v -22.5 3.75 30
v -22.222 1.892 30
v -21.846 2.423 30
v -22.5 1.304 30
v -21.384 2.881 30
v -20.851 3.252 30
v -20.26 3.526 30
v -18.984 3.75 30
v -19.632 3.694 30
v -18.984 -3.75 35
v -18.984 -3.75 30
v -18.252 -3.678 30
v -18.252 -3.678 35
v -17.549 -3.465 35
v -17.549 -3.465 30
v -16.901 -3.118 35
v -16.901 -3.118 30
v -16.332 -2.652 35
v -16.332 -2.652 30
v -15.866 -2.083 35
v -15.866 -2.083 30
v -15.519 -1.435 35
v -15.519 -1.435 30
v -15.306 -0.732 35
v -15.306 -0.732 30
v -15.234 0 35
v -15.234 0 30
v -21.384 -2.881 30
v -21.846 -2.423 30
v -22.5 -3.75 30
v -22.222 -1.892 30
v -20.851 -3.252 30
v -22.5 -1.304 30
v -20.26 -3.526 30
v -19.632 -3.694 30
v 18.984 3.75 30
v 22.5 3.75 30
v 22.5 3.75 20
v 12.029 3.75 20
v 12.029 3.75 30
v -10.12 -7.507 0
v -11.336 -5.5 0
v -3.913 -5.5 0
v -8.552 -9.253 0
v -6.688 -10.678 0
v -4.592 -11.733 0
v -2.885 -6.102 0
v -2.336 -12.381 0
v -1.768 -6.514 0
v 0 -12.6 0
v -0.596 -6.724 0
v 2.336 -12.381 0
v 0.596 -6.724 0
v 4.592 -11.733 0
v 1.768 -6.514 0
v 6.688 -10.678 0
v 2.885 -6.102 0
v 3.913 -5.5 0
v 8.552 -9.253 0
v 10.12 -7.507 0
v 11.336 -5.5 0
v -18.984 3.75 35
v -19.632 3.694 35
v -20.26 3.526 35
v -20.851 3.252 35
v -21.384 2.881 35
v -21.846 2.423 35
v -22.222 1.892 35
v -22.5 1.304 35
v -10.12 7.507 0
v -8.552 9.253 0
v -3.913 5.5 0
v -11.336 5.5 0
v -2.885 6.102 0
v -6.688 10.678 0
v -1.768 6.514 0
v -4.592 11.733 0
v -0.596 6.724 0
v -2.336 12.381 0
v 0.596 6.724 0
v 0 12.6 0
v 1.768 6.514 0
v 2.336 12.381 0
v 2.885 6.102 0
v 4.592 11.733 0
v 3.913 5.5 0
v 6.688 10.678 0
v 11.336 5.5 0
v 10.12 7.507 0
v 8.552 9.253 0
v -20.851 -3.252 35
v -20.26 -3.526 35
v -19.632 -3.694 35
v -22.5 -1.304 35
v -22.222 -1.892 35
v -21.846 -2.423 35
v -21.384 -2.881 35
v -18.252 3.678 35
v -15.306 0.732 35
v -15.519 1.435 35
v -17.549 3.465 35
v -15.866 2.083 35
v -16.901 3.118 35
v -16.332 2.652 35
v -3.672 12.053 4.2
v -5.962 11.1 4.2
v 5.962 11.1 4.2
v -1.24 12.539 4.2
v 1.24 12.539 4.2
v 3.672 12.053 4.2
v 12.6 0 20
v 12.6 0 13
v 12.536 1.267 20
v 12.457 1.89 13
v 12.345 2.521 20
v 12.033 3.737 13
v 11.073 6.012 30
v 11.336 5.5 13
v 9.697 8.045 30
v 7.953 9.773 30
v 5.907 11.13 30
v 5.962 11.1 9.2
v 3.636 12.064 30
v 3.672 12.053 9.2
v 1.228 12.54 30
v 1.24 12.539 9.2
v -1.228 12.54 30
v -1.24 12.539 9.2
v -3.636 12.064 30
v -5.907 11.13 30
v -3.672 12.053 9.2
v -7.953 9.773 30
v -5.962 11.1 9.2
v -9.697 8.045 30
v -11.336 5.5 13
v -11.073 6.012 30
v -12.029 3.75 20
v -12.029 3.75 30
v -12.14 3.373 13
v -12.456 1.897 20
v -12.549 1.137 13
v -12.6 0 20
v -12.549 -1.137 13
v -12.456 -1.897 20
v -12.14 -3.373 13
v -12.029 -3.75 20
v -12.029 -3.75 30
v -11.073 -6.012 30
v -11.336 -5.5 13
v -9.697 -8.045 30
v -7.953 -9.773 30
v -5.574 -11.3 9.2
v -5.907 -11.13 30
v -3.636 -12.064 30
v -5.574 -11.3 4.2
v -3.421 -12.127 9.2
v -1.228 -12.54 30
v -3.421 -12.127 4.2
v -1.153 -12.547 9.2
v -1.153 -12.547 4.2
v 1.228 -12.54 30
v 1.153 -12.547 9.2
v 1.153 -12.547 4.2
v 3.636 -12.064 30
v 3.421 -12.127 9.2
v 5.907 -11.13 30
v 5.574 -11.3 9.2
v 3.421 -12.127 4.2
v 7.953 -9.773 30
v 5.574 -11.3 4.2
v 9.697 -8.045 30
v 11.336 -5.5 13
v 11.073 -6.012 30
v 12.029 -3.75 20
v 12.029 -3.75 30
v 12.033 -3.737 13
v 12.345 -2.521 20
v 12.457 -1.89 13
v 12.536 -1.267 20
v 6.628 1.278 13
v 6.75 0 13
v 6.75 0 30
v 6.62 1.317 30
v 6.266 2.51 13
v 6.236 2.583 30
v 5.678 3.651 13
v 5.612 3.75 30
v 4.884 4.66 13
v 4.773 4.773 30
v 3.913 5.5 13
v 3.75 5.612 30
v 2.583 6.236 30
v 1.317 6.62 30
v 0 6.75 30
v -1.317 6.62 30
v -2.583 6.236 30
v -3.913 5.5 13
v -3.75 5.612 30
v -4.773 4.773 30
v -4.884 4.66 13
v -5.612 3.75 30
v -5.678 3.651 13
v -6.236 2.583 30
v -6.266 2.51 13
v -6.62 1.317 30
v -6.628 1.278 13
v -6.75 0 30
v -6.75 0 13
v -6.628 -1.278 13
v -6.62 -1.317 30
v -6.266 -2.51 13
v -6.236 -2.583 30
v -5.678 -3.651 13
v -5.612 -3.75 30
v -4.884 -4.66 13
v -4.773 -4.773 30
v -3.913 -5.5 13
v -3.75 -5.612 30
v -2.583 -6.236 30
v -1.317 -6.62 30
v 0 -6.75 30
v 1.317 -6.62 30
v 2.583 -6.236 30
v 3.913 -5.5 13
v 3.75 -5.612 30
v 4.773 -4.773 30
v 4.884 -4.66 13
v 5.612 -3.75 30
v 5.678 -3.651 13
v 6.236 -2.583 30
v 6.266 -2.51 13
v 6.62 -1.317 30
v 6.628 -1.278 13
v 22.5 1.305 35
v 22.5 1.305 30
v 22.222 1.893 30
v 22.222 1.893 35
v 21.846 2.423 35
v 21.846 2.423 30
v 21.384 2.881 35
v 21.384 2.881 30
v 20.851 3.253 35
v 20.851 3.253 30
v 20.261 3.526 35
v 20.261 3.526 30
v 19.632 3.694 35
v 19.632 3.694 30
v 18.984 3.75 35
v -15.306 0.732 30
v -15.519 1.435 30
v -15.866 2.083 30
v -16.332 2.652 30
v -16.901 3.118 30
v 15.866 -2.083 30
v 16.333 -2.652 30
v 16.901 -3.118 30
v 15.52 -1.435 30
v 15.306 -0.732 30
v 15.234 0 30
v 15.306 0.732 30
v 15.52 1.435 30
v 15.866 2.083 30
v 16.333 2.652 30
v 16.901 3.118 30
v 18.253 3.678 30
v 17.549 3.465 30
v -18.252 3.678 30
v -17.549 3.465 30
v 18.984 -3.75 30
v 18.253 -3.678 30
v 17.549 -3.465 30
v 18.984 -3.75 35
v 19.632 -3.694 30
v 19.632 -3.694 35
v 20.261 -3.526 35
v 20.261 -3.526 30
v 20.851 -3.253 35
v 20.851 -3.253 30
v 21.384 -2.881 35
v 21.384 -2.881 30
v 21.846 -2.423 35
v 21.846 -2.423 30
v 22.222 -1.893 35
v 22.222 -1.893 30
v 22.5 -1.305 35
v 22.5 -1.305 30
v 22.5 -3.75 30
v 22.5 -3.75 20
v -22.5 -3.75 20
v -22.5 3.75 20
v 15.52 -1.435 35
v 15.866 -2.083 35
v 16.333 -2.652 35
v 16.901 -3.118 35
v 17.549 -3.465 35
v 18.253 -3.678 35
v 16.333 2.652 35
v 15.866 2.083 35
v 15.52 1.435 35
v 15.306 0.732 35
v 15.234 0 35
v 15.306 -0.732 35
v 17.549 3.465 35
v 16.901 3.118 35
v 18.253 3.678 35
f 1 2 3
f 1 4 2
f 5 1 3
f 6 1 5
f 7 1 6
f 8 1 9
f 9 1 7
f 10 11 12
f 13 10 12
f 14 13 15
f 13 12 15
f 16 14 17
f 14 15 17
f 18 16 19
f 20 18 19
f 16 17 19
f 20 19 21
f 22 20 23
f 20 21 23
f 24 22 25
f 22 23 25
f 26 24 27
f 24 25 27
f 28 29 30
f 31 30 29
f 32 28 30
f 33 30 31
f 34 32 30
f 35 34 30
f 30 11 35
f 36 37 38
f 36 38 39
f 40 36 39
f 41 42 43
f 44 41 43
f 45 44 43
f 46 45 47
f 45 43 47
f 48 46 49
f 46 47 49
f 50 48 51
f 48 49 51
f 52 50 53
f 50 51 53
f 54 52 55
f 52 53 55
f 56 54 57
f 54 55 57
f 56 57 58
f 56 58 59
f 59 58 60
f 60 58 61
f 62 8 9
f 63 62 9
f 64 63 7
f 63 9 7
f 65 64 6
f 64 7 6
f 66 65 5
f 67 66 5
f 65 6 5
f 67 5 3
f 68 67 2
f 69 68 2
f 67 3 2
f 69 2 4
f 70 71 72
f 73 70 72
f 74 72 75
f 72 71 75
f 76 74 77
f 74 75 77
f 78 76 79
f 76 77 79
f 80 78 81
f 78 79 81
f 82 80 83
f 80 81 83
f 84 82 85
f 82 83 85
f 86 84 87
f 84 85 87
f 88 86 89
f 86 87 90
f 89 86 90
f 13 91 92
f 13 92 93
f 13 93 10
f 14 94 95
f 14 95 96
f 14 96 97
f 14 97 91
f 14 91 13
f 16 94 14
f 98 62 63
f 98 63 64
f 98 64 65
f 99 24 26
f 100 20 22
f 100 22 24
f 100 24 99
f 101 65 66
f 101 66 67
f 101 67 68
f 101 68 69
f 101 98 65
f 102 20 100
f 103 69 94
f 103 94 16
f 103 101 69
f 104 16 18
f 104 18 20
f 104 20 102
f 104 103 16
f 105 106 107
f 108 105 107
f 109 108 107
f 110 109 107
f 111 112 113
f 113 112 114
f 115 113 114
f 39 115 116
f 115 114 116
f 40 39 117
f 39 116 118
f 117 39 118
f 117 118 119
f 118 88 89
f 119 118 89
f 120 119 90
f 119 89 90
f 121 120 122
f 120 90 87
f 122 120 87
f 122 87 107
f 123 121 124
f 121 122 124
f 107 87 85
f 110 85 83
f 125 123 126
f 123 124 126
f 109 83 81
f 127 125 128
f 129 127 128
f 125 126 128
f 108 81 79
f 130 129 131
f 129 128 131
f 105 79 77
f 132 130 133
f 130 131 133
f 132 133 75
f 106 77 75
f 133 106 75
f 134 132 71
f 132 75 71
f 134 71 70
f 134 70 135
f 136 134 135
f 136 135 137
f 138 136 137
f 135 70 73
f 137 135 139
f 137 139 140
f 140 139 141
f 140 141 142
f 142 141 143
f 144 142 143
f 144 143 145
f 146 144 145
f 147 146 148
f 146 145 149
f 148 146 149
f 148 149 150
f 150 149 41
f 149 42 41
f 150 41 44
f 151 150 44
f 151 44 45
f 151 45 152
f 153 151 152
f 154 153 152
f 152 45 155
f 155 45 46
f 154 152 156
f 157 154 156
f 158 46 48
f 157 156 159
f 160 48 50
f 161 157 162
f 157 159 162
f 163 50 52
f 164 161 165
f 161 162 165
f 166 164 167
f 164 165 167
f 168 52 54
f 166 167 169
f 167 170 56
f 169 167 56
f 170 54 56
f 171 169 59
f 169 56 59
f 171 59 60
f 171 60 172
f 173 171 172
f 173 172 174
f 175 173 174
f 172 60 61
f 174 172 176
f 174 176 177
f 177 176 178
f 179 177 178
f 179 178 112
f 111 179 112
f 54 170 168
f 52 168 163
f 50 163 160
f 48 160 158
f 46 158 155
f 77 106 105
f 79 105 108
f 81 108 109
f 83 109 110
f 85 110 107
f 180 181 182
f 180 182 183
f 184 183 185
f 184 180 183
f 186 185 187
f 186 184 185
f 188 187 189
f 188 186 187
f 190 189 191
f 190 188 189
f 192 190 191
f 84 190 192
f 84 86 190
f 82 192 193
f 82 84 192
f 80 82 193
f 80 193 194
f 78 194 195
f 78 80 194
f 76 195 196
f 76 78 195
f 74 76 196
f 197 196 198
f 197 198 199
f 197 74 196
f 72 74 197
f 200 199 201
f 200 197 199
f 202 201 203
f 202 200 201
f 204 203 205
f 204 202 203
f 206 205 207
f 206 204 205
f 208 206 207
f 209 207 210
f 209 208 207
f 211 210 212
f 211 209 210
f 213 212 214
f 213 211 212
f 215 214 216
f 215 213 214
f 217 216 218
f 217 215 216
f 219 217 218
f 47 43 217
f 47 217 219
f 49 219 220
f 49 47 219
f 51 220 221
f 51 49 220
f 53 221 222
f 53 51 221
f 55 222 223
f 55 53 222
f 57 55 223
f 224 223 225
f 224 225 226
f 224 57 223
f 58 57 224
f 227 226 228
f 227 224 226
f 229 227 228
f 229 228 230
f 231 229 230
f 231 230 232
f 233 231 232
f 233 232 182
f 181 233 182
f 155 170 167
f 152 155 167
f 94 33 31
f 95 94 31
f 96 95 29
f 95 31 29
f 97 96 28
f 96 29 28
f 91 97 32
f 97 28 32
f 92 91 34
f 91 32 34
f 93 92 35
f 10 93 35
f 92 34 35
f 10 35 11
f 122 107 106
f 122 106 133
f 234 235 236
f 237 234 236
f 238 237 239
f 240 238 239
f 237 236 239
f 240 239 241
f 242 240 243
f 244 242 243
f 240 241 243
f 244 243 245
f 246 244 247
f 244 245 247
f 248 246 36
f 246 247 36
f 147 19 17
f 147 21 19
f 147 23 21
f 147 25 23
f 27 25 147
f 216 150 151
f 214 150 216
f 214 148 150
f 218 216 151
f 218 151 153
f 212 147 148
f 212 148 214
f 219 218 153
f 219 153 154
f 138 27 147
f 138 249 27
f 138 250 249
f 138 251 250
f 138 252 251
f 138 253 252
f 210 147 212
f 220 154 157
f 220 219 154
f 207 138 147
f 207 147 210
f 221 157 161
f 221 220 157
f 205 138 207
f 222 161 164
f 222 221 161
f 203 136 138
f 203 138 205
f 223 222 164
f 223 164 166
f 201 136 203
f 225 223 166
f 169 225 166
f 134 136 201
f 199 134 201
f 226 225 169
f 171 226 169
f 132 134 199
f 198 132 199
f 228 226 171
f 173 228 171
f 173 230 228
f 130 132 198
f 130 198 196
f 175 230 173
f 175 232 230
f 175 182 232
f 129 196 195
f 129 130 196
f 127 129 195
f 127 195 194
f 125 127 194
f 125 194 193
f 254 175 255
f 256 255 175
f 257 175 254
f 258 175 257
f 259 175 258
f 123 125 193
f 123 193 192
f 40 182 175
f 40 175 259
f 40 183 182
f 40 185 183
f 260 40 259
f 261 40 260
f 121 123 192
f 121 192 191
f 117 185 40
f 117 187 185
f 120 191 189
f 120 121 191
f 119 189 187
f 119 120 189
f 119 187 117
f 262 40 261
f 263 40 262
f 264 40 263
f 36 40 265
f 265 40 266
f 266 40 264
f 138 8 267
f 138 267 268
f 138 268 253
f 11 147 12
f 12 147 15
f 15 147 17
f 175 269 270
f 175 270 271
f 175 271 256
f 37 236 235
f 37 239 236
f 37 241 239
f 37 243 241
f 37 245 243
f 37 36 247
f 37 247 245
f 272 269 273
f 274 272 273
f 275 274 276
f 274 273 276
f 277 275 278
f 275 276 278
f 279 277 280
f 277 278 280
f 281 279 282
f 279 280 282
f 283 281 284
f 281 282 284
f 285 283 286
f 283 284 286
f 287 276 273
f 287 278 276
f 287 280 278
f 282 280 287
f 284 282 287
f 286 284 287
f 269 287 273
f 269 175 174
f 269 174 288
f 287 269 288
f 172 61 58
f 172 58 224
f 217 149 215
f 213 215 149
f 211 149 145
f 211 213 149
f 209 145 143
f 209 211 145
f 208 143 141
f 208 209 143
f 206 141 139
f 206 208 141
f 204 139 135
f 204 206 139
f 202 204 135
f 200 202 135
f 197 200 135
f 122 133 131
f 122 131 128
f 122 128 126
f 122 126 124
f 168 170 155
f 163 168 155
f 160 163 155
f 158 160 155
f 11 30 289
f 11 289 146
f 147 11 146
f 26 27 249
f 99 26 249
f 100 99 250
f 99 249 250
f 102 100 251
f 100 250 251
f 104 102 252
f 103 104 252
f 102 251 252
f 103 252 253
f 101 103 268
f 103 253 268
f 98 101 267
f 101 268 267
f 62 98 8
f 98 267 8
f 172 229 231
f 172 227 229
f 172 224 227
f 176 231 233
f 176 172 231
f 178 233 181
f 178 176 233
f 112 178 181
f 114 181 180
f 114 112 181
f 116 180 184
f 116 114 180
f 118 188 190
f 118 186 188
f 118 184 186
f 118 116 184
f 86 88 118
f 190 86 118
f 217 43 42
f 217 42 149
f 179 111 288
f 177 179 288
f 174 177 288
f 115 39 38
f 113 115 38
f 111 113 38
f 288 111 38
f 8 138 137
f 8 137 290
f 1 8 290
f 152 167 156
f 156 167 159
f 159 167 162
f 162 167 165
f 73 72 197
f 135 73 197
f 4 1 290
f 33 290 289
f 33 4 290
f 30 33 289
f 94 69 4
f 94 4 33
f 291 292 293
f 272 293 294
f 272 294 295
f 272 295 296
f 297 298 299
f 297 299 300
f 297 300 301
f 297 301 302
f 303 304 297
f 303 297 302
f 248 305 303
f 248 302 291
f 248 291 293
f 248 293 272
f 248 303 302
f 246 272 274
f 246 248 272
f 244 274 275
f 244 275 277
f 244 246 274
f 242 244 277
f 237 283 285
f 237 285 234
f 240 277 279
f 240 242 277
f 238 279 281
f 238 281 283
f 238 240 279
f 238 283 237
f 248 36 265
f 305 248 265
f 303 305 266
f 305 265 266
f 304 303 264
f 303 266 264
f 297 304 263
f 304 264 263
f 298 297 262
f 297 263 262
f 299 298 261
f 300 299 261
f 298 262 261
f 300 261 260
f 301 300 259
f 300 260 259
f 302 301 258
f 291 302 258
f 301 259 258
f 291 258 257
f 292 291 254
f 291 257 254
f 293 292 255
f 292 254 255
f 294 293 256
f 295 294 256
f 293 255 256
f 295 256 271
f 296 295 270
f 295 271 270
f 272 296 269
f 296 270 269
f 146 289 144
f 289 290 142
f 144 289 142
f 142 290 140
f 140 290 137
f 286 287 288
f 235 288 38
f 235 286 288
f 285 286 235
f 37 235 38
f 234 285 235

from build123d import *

# Parameters (mm, degrees)
F0_R      = 12.6
F0_R_2    = 6.75
F1_DEPTH  = 30
F2_W      = 11
F2_H      = 13
F3_DEPTH  = 15
F5_W      = 1.3
F5_H      = 5
F6_DEPTH  = 12.5
F7_W      = 1.5
F7_H      = 5
F8_DEPTH  = 12.5
F10_DEPTH = 10
F12_DEPTH = 5


with BuildPart() as f1:
    # F0 (on Top) → F1 (new body)
    with BuildSketch(Plane.XY):
        Circle(F0_R)
        Circle(F0_R_2, mode=Mode.SUBTRACT)
    extrude(amount=F1_DEPTH)


with BuildPart() as f3:
    # F2 (on Right) → F3 (new body, symmetric)
    with BuildSketch(Plane.YZ):
        with Locations((0, 6.5)):
            Rectangle(F2_W, F2_H)
    extrude(amount=F3_DEPTH, both=True)


with BuildPart() as f1_1:
    add(f1.part)

    # F4: cut F3
    add(f3.part, mode=Mode.SUBTRACT)

    # F5 (on Right) → F6 (cut, symmetric)
    with BuildSketch(Plane.YZ):
        with Locations((-11.95, 6.7)):
            Rectangle(F5_W, F5_H)
    extrude(amount=F6_DEPTH, both=True, mode=Mode.SUBTRACT)

    # F7 (on Right) → F8 (cut, symmetric)
    with BuildSketch(Plane.YZ):
        with Locations((11.85, 6.7)):
            Rectangle(F7_W, F7_H)
    extrude(amount=F8_DEPTH, both=True, mode=Mode.SUBTRACT)

    # F9 (on face) → F10 (join)
    with BuildSketch(Plane.XY.offset(30)):
        with BuildLine():
            Line((-12.0290273921, 3.75), (-22.5, 3.75))
            Line((-22.5, 3.75), (-22.5, -3.75))
            Line((-22.5, -3.75), (-12.0290273921, -3.75))
            ThreePointArc((-12.0290273921, -3.75), (-12.6, 0), (-12.0290273921, 3.75))
        make_face()
        with BuildLine():
            Line((22.5, 3.75), (12.0290273921, 3.75))
            ThreePointArc((12.0290273921, 3.75), (12.4564390004, 1.8966094563), (12.6, 0))
            ThreePointArc((12.6, 0), (12.4564390004, -1.8966094563), (12.0290273921, -3.75))
            Line((12.0290273921, -3.75), (22.5, -3.75))
            Line((22.5, -3.75), (22.5, 3.75))
        make_face()
    extrude(amount=-F10_DEPTH)

    # F11 (on face) → F12 (join)
    with BuildSketch(Plane.XY.offset(30)):
        with BuildLine():
            ThreePointArc((-18.984, -3.75), (-16.3323495706, -2.6516504294), (-15.234, 0))
            ThreePointArc((-15.234, 0), (-16.3323495706, 2.6516504294), (-18.984, 3.75))
            ThreePointArc((-18.984, 3.75), (-21.1255820463, 3.0783317461), (-22.5, 1.3039340474))
            Line((-22.5, 1.3039340474), (-22.5, -1.3039340474))
            ThreePointArc((-22.5, -1.3039340474), (-21.1255820463, -3.0783317461), (-18.984, -3.75))
        make_face()
        with BuildLine():
            ThreePointArc((22.5, 1.3048106807), (21.1255234866, 3.0785987115), (18.9843252301, 3.75))
            ThreePointArc((18.9843252301, 3.75), (15.2343252301, 0), (18.9843252301, -3.75))
            ThreePointArc((18.9843252301, -3.75), (21.1255234866, -3.0785987115), (22.5, -1.3048106807))
            Line((22.5, -1.3048106807), (22.5, 1.3048106807))
        make_face()
    extrude(amount=F12_DEPTH)


solid = f1_1.part
